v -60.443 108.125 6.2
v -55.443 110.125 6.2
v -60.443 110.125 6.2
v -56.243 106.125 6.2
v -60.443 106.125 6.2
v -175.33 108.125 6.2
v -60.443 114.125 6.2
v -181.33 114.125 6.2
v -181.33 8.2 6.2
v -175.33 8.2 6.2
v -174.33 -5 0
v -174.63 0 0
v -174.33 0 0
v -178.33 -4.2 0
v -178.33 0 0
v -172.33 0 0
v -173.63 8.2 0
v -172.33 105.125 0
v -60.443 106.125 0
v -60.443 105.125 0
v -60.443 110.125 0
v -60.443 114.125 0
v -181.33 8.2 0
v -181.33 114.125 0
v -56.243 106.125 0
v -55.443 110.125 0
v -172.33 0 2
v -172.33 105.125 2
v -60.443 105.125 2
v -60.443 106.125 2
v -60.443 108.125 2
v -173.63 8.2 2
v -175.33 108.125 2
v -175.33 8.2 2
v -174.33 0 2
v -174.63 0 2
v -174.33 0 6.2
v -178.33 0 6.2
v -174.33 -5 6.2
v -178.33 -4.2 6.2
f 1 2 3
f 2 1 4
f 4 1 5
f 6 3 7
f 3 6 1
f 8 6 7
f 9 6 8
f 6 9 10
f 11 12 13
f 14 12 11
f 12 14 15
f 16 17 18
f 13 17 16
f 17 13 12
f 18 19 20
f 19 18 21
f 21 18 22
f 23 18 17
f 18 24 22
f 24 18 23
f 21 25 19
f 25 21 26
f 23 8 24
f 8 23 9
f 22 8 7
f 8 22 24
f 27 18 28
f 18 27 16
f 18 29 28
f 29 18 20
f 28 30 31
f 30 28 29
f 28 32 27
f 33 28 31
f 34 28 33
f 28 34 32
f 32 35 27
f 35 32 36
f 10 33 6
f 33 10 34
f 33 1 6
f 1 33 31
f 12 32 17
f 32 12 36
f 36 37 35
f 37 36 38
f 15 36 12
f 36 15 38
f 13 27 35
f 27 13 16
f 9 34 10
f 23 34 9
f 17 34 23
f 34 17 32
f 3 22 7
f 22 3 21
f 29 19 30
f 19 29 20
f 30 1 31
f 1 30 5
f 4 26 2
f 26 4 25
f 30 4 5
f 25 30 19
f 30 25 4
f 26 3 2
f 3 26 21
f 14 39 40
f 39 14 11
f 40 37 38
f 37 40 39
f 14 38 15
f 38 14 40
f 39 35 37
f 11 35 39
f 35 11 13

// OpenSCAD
// ============================================
// Plate 6: 프레임 - 상단 좌 (TL)
// 크기: ~121 x ~114 mm (OK)
// ============================================
use <../src/model_a_frame.scad>

frame_seg_TL();
